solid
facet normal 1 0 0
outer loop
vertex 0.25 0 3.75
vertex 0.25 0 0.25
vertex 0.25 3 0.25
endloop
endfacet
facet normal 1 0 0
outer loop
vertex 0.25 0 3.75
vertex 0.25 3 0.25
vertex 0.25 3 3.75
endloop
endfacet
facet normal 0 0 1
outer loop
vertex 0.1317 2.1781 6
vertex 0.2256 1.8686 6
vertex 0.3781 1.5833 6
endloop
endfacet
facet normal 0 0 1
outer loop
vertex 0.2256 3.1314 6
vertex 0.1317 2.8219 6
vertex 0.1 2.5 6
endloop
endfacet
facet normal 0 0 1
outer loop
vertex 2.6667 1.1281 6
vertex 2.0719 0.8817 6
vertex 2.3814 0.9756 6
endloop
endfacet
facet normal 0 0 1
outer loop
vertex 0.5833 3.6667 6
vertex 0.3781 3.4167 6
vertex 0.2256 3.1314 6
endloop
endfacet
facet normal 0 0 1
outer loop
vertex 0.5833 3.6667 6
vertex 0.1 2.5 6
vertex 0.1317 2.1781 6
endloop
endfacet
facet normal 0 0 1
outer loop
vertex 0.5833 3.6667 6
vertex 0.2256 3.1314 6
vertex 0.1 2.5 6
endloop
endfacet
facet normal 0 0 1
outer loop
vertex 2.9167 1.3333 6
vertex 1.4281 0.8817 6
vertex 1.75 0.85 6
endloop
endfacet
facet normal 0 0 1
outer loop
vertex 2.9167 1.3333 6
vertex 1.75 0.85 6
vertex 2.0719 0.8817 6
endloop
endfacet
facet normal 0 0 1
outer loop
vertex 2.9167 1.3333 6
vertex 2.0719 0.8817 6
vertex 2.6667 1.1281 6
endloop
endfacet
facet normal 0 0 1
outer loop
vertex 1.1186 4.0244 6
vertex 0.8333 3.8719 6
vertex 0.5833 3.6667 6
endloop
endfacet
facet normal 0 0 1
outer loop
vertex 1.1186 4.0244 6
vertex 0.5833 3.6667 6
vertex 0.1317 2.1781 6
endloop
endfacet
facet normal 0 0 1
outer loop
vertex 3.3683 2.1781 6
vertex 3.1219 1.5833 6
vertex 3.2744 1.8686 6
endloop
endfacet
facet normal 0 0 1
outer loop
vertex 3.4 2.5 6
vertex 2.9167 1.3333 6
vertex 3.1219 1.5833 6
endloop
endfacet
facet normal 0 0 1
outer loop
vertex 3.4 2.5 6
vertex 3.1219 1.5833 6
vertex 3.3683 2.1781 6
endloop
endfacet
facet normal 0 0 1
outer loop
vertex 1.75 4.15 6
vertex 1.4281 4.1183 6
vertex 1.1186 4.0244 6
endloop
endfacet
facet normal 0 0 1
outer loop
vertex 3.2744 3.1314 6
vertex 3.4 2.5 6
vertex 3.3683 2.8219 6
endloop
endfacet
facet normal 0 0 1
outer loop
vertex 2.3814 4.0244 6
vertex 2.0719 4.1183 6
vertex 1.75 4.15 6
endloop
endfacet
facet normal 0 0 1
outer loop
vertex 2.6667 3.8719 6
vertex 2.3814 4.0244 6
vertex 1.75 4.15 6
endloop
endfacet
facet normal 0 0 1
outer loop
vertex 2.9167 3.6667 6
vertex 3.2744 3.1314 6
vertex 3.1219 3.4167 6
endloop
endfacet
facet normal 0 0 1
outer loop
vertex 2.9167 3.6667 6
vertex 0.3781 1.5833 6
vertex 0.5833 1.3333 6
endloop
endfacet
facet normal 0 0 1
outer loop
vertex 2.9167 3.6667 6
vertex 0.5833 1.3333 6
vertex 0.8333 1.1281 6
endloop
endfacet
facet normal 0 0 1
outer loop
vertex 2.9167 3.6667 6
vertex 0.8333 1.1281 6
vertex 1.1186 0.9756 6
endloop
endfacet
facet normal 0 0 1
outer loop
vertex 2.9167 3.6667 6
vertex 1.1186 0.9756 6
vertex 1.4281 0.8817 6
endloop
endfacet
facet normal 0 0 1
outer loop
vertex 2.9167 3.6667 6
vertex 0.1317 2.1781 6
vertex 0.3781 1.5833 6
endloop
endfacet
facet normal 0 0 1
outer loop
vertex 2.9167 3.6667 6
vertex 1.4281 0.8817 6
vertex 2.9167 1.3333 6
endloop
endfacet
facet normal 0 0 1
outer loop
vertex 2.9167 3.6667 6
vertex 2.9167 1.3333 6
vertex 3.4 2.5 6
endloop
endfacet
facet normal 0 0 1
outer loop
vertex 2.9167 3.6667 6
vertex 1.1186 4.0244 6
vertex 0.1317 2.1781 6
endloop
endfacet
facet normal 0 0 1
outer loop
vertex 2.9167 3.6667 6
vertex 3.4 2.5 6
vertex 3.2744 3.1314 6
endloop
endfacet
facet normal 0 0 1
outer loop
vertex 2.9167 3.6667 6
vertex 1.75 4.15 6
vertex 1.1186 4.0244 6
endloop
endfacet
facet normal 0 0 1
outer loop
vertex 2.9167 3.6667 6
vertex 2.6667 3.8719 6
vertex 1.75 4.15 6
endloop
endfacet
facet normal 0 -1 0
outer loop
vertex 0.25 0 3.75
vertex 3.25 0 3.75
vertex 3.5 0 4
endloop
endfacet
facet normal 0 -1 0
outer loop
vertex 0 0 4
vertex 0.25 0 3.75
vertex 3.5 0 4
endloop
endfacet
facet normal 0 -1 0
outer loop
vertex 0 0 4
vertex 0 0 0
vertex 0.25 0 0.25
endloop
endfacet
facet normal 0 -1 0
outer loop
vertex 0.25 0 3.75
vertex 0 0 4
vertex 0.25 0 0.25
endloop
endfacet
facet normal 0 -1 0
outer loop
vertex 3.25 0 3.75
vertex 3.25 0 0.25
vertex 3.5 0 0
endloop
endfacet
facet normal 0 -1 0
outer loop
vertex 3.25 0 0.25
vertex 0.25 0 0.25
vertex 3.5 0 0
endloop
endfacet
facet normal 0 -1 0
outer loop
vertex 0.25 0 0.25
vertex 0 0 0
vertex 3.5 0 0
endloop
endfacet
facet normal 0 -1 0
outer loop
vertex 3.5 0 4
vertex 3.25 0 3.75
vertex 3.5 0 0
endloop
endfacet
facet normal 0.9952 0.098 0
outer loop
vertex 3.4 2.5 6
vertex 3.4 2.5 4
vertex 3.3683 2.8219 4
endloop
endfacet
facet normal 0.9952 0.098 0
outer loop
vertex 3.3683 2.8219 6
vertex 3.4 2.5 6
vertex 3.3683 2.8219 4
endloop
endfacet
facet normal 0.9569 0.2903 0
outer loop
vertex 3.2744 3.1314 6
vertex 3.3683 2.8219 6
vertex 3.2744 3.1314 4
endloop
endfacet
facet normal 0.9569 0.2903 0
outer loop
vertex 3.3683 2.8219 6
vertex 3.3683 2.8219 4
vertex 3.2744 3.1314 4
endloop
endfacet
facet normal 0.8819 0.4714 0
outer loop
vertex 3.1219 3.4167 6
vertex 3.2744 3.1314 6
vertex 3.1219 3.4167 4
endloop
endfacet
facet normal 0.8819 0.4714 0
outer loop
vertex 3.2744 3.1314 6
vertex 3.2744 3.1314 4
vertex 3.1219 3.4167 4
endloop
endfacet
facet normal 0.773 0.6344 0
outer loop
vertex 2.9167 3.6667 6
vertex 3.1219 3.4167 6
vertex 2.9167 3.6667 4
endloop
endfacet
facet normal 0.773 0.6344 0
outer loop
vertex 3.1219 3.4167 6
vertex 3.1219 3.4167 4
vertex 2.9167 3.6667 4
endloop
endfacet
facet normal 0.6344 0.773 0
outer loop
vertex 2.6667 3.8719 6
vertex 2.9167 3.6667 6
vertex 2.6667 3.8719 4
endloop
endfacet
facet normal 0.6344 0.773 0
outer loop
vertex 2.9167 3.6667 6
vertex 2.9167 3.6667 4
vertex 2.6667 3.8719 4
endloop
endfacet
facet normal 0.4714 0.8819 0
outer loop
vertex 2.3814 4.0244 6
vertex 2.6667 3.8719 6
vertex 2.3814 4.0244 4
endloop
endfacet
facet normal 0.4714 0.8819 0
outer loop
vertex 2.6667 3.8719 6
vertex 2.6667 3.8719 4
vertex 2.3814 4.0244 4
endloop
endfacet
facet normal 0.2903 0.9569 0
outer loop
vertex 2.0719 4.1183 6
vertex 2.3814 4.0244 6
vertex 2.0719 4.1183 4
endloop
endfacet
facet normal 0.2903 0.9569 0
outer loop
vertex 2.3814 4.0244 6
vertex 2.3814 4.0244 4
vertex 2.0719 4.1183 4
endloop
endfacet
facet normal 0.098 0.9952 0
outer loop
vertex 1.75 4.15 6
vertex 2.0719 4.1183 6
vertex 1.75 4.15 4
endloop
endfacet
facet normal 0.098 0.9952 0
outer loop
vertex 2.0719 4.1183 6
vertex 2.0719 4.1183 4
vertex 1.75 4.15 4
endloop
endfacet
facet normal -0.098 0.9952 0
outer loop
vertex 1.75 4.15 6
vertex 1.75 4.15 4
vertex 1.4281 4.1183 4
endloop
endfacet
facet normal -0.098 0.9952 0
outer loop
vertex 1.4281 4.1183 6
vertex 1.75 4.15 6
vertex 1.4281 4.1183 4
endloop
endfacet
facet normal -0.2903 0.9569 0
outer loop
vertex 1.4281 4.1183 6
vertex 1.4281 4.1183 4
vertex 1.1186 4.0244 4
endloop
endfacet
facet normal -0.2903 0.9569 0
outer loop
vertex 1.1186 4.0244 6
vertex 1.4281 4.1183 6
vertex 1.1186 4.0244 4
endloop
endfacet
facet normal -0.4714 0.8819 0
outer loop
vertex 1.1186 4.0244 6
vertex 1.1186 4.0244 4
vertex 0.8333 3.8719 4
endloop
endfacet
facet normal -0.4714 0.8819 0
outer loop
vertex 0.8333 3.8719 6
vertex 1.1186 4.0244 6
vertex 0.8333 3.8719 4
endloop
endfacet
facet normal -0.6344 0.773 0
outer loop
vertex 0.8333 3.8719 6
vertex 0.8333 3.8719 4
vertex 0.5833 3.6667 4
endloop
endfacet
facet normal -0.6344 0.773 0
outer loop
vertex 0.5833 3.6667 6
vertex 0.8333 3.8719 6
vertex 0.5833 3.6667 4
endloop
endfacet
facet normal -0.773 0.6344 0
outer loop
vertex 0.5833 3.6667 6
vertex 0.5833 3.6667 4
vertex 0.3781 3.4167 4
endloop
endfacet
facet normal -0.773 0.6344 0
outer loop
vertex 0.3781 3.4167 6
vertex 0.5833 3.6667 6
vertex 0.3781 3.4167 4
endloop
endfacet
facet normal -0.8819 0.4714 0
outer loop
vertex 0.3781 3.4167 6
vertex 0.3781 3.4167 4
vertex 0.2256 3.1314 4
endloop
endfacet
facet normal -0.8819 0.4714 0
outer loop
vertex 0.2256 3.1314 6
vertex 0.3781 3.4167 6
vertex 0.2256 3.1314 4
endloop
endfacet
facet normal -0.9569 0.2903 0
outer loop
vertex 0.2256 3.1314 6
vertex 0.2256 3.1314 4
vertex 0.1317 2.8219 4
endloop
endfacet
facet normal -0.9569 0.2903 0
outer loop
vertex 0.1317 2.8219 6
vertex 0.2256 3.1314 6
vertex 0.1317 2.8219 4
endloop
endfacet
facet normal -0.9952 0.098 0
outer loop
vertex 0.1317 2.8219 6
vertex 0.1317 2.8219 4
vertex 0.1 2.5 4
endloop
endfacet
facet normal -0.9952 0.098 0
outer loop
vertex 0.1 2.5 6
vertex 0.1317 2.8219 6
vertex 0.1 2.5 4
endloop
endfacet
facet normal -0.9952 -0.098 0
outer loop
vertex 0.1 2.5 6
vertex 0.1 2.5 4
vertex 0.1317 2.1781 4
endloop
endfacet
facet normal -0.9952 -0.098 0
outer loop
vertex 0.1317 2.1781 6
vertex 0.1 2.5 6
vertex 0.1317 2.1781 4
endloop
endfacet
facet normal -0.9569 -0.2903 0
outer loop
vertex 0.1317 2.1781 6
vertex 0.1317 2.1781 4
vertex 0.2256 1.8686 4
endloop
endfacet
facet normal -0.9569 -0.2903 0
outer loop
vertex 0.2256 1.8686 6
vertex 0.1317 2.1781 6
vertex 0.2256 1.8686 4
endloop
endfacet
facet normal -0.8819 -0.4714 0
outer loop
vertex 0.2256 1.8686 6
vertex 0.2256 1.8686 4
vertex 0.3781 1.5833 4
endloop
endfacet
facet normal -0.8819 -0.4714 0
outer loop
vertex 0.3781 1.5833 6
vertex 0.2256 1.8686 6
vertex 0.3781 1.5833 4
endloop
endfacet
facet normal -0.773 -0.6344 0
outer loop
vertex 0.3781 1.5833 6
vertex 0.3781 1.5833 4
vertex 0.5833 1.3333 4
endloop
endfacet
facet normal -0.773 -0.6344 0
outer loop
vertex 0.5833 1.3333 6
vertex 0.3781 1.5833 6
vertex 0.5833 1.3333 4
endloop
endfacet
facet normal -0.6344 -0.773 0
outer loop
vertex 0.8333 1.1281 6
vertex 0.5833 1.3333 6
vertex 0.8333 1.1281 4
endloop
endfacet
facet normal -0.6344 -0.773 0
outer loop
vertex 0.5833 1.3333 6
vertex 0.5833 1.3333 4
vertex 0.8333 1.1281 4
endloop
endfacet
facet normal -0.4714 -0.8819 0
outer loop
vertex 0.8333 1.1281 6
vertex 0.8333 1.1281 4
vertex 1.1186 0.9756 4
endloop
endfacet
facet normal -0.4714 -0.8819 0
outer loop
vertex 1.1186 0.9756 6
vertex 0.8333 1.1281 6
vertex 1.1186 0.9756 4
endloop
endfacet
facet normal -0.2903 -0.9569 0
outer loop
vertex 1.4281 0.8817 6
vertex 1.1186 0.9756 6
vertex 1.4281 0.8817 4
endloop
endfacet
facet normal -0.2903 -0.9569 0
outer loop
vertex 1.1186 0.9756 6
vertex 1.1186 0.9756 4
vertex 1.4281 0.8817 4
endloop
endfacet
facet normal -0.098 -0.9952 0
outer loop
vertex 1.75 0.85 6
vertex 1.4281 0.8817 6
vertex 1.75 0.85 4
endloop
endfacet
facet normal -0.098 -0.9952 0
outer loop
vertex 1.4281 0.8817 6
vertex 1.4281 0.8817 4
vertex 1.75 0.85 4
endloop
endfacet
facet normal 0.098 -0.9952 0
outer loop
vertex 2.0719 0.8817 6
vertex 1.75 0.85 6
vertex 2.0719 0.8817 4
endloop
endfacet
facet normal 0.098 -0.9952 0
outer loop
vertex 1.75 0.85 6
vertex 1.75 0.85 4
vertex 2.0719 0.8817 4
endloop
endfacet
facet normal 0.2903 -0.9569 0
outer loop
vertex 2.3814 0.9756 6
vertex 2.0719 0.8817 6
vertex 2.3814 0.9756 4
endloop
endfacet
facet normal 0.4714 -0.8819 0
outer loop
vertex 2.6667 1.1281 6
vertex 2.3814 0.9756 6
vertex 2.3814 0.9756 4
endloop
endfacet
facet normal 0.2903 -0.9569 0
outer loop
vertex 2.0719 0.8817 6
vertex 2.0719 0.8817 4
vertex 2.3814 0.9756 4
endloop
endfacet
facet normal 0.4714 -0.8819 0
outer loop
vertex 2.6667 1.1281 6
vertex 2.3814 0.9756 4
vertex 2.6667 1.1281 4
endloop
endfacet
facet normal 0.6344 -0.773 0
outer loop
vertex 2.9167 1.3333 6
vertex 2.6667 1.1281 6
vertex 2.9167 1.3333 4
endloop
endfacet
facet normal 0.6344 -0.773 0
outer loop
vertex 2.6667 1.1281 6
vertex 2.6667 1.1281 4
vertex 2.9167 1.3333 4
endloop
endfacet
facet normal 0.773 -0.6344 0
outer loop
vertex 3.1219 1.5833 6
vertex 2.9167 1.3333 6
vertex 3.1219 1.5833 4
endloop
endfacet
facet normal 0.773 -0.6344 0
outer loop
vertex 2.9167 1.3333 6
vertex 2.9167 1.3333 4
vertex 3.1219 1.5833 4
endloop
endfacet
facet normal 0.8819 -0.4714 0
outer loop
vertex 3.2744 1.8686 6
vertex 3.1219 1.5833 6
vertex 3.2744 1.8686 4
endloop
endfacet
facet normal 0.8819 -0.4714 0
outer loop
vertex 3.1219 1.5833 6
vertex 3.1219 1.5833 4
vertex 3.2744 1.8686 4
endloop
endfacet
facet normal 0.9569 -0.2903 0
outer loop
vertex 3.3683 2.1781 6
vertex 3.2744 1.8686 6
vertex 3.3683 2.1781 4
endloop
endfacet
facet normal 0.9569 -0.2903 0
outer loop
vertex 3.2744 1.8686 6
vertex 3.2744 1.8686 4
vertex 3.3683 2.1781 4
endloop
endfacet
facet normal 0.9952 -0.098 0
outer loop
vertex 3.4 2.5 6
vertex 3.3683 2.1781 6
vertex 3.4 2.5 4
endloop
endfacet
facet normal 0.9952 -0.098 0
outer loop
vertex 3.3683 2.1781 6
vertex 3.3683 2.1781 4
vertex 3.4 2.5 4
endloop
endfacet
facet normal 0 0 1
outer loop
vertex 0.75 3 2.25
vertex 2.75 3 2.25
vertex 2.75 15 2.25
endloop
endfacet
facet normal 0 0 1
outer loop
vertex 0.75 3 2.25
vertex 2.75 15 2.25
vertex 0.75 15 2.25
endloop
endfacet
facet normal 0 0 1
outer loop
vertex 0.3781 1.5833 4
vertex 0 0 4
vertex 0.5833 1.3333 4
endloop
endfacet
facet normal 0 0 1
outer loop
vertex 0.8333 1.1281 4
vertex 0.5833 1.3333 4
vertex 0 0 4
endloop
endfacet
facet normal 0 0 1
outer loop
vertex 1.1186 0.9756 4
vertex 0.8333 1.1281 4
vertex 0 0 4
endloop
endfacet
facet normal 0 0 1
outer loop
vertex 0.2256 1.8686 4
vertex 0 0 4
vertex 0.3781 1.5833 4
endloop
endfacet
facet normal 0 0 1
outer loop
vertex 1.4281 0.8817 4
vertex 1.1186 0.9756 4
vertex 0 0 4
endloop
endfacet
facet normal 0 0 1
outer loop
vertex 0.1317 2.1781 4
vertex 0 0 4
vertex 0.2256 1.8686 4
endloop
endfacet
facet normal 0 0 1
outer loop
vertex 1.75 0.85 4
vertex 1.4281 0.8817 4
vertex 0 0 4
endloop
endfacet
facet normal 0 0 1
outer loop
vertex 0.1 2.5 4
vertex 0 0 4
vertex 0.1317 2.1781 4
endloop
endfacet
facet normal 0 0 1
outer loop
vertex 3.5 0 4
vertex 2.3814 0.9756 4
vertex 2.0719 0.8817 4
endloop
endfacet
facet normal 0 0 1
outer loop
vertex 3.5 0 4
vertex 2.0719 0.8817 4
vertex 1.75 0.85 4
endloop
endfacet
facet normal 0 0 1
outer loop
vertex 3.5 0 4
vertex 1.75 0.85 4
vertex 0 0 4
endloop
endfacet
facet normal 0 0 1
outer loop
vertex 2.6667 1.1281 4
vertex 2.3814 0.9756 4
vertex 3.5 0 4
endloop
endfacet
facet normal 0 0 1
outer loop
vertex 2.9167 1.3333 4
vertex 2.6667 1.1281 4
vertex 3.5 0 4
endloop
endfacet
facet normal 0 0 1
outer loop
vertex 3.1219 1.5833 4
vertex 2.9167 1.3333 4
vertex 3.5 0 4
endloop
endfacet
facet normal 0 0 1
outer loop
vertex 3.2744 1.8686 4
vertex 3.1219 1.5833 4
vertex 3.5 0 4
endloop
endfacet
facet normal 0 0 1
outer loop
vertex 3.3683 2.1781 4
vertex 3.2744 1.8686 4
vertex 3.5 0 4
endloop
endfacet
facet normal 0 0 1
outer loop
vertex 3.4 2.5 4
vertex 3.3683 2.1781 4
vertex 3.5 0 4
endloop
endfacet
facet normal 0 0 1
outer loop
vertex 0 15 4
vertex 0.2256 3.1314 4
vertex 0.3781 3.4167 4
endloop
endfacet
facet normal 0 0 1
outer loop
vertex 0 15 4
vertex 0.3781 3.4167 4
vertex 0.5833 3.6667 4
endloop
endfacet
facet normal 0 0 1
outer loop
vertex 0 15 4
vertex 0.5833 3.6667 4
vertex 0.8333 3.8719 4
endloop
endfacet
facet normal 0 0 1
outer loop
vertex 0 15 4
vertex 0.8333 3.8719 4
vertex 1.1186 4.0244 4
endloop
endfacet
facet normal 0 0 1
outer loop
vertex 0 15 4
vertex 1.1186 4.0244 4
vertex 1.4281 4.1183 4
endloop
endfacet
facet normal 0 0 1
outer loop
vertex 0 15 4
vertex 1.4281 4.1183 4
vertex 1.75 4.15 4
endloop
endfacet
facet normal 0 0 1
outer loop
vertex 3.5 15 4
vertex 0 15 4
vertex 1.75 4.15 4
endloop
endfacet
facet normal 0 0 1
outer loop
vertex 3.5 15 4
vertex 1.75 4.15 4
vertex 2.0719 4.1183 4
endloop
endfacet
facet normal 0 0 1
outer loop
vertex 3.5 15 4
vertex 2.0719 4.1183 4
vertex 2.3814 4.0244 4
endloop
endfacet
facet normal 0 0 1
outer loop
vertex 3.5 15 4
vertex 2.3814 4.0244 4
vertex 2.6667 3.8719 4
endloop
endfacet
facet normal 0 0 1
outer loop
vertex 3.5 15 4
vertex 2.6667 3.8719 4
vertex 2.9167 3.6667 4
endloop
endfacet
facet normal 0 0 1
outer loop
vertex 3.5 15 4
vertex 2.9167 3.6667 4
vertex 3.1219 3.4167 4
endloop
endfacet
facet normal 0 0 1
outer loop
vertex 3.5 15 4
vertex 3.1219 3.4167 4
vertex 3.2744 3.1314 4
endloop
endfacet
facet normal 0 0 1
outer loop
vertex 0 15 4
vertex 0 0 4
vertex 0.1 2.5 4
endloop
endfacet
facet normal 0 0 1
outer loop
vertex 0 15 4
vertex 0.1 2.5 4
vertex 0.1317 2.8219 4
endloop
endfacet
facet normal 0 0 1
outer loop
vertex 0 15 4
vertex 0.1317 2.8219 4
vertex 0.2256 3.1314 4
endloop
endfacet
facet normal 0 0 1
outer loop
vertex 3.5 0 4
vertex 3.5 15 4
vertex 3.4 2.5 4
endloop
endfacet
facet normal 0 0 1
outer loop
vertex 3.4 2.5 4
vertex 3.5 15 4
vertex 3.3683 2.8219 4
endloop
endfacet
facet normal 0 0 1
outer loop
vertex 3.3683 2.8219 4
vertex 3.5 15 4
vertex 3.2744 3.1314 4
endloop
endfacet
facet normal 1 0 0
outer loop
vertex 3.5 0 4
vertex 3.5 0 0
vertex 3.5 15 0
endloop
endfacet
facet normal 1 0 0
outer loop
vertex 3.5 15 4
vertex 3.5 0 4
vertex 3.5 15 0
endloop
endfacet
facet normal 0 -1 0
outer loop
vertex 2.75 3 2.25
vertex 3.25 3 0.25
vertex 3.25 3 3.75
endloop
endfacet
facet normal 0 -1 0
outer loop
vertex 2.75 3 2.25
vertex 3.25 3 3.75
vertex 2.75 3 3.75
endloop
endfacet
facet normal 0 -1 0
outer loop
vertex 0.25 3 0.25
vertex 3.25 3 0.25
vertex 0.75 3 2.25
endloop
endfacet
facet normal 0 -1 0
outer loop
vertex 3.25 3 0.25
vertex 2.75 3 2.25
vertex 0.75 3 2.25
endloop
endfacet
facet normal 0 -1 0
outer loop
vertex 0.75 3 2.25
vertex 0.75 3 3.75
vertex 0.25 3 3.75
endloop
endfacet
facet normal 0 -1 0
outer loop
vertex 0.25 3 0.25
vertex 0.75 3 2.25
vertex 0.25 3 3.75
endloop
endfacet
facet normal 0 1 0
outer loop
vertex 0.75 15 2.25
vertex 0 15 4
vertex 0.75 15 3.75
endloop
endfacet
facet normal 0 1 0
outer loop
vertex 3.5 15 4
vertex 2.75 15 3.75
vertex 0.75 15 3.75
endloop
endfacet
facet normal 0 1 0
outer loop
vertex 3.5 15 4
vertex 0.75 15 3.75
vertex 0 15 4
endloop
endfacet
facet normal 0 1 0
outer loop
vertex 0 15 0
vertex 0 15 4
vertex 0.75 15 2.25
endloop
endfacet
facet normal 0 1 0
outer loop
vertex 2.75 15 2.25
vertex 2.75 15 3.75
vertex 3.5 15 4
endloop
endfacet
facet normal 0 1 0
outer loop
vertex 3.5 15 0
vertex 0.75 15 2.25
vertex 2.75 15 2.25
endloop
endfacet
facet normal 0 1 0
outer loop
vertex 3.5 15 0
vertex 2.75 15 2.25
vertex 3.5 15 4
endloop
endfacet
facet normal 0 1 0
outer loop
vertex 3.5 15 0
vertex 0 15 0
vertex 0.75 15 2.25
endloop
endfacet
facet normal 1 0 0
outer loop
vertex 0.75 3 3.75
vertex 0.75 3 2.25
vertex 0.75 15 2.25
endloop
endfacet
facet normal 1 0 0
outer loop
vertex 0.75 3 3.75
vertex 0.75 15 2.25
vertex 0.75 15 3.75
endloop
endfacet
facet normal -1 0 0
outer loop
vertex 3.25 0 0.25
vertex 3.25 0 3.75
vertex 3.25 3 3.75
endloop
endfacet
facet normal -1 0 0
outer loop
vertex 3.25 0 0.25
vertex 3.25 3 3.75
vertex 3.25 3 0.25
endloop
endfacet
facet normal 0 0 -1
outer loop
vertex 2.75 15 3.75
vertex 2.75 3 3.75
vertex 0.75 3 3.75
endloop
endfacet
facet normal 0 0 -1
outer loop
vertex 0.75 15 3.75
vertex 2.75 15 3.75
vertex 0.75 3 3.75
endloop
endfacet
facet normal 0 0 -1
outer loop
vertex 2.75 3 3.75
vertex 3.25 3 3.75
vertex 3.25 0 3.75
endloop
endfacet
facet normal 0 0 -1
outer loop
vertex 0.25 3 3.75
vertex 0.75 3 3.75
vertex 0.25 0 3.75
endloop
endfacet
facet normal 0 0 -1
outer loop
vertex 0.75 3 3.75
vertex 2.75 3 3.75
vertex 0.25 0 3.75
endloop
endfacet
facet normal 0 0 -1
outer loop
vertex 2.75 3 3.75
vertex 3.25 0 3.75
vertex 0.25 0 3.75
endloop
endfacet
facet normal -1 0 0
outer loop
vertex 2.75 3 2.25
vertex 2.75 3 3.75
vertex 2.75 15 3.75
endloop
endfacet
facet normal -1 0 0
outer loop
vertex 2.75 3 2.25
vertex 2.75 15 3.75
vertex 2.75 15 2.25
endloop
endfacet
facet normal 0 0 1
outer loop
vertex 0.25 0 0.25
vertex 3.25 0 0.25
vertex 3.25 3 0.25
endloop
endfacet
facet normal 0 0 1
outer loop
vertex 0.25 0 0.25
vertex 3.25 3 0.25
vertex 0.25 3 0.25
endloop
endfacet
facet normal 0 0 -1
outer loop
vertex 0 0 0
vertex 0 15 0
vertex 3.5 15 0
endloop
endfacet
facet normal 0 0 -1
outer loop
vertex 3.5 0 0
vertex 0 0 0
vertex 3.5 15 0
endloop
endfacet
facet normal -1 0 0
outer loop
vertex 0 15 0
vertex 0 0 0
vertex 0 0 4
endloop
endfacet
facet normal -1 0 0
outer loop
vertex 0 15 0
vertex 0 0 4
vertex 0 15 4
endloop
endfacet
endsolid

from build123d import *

# Parameters (mm, degrees)
SKETCH_W        = 3.5
SKETCH_H        = 15
PAD_DEPTH       = 4
SKETCH001_R     = 1.65
PAD001_DEPTH    = 6
POCKET_DEPTH    = 3
POCKET001_DEPTH = 15.001


with BuildPart() as part:
    # Sketch → Pad (new body)
    with BuildSketch(Plane.XY):
        with Locations((1.75, 7.5)):
            Rectangle(SKETCH_W, SKETCH_H)
    extrude(amount=PAD_DEPTH)

    # Sketch001 → Pad001 (join)
    with BuildSketch(Plane.XY):
        with Locations((1.75, 2.5)):
            Circle(SKETCH001_R)
    extrude(amount=PAD001_DEPTH)

    # Sketch002 (on Face1 of Pad001) → Pocket (cut)
    with BuildSketch(Plane.XZ):
        Polygon((3.25, 3.75), (3.25, 0.25), (0.25, 0.25), (0.25, 3.75), (1.75, 3.75), align=None)
    extrude(amount=-POCKET_DEPTH, mode=Mode.SUBTRACT)

    # Sketch003 → Pocket001 (cut, through all)
    with BuildSketch(Plane.XZ):
        Polygon((0.75, 3.75), (1.75, 3.75), (2.75, 3.75), (2.75, 2.25), (0.75, 2.25), align=None)
    extrude(amount=-POCKET001_DEPTH, mode=Mode.SUBTRACT)


solid = part.part
